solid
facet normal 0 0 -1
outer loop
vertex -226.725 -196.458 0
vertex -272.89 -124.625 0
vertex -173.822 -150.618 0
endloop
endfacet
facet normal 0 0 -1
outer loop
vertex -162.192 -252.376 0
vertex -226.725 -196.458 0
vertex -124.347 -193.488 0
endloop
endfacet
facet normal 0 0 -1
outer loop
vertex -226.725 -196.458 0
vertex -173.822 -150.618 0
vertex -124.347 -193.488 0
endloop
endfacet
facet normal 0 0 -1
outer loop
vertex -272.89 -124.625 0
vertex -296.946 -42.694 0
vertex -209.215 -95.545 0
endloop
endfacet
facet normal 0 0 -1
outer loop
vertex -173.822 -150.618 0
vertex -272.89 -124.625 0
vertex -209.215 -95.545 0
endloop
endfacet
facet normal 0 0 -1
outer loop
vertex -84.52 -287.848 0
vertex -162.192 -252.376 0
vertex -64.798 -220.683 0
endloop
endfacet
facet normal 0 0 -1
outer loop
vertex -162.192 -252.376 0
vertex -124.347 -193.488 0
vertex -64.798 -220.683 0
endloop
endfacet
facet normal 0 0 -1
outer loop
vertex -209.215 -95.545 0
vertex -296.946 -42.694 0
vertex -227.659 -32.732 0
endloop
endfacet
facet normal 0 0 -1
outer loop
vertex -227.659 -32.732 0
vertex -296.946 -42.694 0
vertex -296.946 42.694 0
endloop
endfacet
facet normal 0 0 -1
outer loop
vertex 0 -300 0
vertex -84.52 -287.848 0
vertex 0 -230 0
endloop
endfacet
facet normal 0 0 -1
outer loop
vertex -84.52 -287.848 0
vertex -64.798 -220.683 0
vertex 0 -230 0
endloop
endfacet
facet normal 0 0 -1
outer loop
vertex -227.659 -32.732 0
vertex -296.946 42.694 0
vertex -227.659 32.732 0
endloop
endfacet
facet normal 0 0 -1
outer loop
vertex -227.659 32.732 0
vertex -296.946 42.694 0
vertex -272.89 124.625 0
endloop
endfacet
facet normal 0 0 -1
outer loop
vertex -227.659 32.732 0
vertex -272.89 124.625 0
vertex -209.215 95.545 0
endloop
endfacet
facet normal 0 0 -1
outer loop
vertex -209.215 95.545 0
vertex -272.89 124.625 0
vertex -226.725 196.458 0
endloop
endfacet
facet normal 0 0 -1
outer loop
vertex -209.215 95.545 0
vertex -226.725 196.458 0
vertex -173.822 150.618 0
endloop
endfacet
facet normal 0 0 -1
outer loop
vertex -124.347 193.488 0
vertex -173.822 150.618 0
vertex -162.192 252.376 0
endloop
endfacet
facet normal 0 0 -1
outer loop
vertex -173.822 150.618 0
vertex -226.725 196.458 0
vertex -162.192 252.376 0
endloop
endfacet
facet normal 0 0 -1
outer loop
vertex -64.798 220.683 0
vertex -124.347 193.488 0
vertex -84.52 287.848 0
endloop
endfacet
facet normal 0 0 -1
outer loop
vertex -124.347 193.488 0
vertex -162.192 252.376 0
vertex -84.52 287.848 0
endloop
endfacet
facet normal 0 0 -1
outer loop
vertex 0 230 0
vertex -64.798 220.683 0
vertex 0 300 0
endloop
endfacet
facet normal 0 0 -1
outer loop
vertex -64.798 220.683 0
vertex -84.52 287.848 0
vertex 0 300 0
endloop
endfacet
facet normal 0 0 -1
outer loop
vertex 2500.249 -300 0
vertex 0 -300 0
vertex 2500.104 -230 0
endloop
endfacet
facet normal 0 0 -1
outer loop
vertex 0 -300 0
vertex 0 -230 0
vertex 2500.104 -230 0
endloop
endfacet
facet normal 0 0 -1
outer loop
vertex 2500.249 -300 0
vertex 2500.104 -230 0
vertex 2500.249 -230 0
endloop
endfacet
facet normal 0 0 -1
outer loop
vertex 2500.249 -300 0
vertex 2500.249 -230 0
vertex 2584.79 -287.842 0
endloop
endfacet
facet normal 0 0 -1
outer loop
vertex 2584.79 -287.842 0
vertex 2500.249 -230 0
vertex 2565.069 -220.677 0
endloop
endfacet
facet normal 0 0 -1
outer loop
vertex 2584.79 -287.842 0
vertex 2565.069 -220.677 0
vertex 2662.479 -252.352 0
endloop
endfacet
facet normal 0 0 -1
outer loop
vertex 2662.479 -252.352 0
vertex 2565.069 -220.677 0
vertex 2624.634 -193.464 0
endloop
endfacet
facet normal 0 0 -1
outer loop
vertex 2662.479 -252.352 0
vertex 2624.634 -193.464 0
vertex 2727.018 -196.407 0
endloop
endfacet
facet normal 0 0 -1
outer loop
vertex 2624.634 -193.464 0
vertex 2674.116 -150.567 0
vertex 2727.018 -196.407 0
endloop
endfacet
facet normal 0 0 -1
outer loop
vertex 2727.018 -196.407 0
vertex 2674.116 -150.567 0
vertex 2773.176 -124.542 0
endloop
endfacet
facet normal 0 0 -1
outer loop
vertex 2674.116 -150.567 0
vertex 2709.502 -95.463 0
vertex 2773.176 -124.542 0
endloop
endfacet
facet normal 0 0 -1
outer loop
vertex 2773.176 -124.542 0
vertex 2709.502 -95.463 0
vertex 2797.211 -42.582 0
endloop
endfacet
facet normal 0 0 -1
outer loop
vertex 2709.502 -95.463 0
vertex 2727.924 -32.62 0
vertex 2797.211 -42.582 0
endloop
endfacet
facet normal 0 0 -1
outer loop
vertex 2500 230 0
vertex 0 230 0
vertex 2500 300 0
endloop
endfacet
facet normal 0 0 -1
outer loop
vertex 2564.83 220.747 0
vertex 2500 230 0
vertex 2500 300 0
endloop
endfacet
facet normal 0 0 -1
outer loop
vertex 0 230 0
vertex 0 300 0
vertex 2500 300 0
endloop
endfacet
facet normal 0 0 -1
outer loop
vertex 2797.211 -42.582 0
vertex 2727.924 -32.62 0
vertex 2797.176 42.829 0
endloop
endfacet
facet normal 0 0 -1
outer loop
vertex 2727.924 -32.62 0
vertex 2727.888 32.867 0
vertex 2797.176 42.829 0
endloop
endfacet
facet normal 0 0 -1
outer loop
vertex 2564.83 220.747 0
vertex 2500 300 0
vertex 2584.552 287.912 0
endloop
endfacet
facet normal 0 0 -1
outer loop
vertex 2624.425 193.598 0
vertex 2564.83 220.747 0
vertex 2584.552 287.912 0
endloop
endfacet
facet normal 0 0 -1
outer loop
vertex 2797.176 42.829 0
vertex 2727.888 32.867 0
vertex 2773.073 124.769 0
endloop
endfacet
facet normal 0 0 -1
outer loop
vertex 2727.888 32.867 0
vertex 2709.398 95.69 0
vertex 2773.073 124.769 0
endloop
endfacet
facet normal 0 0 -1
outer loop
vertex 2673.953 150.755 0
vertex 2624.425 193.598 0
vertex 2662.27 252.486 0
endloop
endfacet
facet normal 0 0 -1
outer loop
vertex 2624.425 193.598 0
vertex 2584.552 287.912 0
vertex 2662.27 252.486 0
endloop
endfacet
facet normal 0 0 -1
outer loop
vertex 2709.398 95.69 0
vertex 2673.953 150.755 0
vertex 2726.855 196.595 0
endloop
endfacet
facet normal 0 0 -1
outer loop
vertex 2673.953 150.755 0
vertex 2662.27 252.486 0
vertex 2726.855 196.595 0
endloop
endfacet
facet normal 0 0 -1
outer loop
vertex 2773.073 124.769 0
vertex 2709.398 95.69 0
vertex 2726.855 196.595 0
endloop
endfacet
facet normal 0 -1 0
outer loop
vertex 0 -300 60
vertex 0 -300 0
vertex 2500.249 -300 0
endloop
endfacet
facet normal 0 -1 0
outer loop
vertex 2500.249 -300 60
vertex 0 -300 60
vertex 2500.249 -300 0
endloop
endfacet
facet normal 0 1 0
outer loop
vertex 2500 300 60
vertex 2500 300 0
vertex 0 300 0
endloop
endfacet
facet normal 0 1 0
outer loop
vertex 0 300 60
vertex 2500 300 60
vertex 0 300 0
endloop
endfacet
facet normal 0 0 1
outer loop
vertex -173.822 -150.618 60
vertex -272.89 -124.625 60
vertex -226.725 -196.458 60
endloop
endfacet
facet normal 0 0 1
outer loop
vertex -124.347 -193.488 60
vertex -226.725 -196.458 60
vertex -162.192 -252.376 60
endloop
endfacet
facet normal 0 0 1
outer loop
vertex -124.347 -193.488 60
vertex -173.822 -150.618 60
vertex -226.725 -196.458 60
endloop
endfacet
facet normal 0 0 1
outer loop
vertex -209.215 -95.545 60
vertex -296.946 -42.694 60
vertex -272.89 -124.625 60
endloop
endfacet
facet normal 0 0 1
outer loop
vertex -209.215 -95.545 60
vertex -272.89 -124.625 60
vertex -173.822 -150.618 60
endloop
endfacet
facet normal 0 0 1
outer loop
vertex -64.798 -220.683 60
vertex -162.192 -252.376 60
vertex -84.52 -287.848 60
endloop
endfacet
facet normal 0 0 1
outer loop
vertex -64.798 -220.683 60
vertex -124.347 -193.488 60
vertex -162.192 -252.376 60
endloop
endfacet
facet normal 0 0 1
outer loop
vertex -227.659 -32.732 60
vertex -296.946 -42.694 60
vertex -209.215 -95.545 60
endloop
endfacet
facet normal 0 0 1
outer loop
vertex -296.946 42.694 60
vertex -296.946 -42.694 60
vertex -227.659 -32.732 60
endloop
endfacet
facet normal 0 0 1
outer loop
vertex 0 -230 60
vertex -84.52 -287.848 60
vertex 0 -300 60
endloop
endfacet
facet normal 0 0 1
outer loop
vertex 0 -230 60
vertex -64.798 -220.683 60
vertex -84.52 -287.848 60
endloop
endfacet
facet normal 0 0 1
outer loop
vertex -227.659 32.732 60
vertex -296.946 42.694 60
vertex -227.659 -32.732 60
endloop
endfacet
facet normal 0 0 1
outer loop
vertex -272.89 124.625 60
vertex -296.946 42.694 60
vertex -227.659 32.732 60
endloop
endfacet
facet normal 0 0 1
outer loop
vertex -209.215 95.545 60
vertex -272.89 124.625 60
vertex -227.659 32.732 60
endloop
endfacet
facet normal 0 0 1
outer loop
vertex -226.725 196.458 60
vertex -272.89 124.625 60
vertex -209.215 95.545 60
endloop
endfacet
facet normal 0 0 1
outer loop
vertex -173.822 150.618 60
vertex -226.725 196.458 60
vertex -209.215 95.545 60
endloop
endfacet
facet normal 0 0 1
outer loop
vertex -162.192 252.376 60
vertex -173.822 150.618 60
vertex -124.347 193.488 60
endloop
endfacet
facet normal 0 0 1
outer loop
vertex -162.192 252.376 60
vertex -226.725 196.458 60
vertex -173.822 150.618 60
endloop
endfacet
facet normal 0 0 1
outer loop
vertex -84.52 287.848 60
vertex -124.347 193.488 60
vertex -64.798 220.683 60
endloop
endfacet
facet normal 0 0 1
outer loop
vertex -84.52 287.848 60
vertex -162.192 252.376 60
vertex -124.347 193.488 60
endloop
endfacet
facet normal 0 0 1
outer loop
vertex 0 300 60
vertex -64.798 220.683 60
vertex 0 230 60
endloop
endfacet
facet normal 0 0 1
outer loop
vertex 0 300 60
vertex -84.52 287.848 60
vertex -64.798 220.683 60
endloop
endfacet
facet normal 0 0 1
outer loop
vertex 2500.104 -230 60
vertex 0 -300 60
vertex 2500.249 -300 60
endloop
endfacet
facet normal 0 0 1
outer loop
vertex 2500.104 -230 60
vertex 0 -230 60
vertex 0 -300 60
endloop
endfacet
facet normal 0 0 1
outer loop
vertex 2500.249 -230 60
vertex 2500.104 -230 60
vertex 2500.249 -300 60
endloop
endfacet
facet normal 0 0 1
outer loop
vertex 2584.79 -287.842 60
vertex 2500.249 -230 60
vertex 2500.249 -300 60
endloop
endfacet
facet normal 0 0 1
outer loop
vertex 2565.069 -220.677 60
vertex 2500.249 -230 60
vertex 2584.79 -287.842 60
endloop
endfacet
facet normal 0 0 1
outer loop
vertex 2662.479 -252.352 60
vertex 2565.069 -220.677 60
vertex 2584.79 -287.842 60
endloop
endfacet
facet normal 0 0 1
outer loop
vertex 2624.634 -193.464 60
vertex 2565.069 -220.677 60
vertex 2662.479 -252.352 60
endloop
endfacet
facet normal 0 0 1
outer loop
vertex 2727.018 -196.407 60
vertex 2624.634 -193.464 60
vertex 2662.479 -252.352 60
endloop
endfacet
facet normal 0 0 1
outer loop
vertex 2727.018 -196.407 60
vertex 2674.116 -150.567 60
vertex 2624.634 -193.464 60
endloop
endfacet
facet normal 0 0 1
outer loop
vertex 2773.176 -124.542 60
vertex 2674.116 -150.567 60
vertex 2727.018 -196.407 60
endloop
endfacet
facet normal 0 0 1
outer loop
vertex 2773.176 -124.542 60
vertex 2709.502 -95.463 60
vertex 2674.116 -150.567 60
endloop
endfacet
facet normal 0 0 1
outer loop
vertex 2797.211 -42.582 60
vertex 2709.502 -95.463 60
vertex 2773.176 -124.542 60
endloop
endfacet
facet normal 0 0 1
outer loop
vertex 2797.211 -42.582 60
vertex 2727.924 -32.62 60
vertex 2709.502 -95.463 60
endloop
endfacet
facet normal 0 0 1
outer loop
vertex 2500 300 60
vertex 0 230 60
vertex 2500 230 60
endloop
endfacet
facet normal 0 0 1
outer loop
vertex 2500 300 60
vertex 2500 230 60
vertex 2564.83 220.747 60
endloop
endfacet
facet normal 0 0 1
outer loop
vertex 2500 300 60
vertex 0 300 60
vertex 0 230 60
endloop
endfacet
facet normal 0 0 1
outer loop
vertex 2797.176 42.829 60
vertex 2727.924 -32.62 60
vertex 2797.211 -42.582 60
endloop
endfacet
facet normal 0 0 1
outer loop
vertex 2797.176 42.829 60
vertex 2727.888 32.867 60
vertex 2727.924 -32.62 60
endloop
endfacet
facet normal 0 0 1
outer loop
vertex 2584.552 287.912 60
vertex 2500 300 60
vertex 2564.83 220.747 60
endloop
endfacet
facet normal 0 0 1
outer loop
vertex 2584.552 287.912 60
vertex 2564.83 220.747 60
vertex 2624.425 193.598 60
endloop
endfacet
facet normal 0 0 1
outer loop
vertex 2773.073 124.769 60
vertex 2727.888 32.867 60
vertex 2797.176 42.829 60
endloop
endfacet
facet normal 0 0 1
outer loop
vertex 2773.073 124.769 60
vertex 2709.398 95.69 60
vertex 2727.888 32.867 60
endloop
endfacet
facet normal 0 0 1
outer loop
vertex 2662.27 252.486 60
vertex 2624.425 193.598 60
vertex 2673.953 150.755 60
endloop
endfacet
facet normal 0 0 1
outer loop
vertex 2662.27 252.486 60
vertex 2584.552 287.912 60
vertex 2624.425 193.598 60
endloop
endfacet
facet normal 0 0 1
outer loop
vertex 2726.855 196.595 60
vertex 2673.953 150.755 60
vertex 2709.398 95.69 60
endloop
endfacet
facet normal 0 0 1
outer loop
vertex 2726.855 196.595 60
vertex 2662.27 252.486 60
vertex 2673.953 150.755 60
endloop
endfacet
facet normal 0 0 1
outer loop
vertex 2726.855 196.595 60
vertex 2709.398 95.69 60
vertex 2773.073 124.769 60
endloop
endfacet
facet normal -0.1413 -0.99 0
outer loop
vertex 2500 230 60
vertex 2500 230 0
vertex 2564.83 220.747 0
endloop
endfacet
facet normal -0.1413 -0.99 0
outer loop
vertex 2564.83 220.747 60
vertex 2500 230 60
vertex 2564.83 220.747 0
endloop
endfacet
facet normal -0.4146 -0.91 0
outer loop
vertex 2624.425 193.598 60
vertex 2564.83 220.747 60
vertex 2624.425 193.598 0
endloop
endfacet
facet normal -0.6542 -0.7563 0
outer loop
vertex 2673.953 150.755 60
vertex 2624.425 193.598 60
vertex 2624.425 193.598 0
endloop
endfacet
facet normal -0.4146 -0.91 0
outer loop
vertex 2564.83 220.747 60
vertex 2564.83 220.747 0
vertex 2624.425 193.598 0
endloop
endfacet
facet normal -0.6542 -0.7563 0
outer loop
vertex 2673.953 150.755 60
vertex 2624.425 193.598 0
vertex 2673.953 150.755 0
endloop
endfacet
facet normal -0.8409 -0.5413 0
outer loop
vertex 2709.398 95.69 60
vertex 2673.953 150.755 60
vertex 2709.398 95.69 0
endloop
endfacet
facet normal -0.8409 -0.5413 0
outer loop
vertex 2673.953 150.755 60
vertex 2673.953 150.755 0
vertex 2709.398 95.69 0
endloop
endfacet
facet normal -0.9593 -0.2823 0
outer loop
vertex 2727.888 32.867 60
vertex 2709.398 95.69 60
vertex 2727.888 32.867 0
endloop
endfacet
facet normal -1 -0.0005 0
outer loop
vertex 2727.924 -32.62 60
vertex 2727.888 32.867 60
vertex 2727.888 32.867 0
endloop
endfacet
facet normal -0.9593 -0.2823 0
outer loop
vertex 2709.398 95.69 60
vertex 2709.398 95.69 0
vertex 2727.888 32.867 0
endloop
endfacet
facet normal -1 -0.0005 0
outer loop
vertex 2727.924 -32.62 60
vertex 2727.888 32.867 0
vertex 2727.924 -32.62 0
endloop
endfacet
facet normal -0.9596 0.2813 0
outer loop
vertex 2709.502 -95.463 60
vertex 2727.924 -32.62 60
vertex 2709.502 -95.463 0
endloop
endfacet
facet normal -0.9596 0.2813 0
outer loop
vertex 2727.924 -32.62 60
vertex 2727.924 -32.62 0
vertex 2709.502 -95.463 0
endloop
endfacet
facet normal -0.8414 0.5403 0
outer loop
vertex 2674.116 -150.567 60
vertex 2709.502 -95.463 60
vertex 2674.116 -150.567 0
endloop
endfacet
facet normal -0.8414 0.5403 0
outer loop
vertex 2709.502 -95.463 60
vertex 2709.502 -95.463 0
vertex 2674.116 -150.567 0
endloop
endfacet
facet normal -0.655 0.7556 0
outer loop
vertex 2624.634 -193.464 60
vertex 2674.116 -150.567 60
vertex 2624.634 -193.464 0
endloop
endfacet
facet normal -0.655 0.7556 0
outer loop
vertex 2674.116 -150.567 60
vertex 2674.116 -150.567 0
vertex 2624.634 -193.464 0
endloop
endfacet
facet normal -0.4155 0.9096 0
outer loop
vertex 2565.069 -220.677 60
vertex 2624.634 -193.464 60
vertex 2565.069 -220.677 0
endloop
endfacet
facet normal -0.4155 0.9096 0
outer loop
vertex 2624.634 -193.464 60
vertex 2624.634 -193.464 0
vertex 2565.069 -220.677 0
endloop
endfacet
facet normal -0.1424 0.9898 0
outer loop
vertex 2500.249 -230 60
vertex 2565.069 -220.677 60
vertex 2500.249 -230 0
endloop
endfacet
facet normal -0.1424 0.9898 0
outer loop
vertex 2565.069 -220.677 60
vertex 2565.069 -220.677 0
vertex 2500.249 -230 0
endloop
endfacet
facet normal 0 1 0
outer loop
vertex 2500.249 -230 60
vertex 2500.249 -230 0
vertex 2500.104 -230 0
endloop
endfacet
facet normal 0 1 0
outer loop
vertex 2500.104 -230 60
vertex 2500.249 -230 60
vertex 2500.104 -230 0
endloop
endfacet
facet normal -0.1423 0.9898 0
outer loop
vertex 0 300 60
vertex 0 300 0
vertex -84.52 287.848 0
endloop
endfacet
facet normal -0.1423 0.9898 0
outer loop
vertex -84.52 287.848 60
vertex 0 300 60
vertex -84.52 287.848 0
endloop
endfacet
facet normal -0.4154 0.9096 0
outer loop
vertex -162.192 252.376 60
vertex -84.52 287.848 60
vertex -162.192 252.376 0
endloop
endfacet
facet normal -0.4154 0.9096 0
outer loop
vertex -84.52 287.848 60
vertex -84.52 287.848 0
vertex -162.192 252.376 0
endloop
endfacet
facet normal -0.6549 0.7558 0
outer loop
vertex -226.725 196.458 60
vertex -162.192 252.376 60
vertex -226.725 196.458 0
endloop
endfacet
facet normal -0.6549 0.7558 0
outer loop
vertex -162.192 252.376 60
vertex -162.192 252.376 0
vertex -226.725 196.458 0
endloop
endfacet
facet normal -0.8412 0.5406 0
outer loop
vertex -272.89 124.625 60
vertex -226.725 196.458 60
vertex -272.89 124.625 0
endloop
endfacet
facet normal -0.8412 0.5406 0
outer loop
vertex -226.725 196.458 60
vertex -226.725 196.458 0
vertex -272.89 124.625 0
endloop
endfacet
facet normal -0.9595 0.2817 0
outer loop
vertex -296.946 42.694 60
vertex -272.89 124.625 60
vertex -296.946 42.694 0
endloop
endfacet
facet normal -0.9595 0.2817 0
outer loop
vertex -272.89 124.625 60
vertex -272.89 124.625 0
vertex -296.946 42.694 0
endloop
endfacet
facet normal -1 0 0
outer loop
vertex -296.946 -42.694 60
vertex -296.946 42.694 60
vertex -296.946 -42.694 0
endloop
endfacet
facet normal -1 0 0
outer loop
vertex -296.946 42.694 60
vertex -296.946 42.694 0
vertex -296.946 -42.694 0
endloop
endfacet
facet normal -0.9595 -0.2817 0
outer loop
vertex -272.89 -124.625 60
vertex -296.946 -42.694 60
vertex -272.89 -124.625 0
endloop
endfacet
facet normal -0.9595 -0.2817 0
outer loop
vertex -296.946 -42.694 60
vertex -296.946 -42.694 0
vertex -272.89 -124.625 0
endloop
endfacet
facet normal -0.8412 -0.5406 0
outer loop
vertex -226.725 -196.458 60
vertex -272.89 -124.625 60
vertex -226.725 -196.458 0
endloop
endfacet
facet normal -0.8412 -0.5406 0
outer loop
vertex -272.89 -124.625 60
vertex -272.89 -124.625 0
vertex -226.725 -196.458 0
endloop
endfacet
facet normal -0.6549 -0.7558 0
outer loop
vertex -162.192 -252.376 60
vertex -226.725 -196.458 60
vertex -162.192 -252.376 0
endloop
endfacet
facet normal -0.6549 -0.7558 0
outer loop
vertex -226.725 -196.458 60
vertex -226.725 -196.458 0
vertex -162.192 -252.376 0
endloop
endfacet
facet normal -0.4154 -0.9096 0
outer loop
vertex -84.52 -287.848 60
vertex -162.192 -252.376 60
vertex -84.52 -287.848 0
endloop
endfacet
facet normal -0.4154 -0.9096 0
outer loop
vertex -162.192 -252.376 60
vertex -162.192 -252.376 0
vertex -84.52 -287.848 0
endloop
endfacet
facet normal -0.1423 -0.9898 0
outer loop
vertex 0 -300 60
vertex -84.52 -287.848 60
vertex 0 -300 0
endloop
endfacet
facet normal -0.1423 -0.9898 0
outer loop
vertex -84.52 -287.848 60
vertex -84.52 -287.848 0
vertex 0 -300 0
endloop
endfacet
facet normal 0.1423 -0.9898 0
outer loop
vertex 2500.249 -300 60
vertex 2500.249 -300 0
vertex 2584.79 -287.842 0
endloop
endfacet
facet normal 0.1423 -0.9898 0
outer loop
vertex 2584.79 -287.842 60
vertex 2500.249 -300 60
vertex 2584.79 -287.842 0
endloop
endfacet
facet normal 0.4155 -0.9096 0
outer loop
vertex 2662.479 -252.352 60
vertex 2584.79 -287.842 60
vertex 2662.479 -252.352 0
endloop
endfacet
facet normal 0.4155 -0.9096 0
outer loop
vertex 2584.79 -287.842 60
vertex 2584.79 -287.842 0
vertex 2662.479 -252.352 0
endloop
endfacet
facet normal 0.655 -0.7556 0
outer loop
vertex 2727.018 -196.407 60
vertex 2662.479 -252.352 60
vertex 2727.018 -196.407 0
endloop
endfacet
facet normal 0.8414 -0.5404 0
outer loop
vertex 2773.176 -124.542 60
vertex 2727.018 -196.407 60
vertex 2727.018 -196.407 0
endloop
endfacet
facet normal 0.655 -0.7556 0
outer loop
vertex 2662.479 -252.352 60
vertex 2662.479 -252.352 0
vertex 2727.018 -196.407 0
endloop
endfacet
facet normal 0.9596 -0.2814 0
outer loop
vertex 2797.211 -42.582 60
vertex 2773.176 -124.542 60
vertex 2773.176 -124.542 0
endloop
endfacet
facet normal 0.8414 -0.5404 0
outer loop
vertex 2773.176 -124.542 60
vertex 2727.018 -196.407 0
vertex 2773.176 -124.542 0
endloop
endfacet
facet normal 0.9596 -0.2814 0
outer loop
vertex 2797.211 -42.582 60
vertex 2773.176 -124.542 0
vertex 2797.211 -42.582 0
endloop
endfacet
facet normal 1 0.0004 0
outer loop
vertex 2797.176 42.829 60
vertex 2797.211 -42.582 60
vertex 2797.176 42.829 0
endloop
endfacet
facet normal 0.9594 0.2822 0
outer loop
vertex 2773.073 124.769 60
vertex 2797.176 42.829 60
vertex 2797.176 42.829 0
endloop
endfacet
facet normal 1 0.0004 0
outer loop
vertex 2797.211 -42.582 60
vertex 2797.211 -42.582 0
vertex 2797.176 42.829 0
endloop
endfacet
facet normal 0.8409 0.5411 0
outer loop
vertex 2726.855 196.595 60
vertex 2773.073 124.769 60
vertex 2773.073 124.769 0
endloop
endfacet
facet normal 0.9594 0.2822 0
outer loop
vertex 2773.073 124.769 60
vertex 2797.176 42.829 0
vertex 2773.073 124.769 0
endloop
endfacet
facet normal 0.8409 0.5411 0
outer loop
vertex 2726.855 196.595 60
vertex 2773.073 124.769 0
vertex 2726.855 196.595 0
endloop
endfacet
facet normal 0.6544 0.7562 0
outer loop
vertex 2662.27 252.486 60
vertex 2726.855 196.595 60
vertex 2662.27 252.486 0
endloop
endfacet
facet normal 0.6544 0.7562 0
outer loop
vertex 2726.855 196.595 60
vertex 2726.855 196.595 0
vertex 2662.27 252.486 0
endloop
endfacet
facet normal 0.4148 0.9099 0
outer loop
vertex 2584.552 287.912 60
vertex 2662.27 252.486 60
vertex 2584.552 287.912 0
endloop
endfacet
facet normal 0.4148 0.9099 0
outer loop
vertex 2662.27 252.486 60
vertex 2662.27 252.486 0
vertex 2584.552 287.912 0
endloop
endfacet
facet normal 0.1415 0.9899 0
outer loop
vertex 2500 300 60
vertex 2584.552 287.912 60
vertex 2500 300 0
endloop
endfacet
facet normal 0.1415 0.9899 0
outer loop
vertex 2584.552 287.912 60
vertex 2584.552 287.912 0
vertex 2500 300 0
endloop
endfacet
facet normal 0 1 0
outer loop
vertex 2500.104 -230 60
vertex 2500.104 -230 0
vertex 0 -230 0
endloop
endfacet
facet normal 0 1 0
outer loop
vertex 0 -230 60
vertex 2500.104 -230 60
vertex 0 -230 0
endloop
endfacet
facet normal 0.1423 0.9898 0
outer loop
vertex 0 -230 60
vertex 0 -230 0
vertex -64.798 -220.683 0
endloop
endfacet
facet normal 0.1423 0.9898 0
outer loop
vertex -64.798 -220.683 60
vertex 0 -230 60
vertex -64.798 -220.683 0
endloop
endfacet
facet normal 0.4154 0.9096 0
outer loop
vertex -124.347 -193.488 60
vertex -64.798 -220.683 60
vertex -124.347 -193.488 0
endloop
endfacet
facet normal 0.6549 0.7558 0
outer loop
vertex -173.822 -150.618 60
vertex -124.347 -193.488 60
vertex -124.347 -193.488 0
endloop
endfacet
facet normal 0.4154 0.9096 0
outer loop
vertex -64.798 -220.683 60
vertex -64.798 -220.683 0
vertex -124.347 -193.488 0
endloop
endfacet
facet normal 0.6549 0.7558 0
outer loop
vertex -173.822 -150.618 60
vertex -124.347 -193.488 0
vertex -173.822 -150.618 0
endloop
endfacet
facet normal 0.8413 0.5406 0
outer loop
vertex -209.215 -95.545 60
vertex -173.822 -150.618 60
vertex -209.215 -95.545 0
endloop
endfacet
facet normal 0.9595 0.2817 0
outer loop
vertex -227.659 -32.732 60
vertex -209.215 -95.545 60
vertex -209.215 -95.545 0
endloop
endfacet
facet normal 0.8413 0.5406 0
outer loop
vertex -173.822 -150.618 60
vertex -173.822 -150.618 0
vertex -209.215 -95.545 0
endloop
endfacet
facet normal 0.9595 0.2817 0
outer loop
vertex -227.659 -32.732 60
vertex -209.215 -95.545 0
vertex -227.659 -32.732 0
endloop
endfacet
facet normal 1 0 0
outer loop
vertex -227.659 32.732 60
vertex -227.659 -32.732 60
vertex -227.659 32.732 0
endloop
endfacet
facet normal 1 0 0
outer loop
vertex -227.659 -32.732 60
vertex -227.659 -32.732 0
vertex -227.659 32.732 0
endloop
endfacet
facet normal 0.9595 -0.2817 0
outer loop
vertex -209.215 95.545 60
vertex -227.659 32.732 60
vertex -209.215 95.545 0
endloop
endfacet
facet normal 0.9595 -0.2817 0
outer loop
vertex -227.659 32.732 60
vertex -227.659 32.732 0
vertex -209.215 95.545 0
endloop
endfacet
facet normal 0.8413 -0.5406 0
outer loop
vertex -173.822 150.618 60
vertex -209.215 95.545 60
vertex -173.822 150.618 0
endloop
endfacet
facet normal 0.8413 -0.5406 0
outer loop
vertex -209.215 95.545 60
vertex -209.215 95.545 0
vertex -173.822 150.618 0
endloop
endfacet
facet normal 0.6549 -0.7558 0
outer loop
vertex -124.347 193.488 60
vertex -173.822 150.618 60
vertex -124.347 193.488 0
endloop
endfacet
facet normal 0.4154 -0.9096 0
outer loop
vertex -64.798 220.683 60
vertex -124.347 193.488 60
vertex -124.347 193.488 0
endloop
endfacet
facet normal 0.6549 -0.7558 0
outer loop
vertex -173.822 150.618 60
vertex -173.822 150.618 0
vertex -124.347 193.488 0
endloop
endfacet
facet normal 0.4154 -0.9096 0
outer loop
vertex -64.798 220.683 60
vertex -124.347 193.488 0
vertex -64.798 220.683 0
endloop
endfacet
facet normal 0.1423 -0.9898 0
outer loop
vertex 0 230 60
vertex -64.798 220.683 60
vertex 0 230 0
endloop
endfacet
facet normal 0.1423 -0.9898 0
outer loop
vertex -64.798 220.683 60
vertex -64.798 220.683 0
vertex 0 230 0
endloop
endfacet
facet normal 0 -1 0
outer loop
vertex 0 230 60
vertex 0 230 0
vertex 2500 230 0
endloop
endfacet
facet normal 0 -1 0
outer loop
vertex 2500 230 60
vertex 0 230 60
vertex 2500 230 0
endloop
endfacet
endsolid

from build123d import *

# Parameters (mm, degrees)
F1_DEPTH = 60


# Not quite as in the source:
# - ends of sketch curves that miss each other by under 0.0002 mm in the source are joined


with BuildPart() as f1:
    # F0 (on Top) → F1 (new body)
    with BuildSketch(Plane.XY):
        with BuildLine():
            Line((2500, 299.9998967548), (0, 300))
            ThreePointArc((0, 300), (-300, 6.1947e-06), (0, -300))
            Line((0, -300), (2500.2488918055, -300))
            ThreePointArc((2500.2488918055, -300), (2800.2488659941, 0.1244459134), (2500, 299.9998967548))
        make_face()
        with BuildLine():
            ThreePointArc((0, -230), (-230, 4.7493e-06), (9.4986e-06, 230))
            Line((9.4986e-06, 230), (2500, 229.9998967548))
            ThreePointArc((2500, 229.9998967548), (2730.248889561, 0.1244459209), (2500.2488918055, -230.0000314225))
            Line((2500.2488918055, -230.0000314225), (2500.1035879766, -229.9999855242))
            Line((2500.1035879766, -229.9999855242), (0, -230))
        make_face(mode=Mode.SUBTRACT)
    extrude(amount=F1_DEPTH)


solid = f1.part
